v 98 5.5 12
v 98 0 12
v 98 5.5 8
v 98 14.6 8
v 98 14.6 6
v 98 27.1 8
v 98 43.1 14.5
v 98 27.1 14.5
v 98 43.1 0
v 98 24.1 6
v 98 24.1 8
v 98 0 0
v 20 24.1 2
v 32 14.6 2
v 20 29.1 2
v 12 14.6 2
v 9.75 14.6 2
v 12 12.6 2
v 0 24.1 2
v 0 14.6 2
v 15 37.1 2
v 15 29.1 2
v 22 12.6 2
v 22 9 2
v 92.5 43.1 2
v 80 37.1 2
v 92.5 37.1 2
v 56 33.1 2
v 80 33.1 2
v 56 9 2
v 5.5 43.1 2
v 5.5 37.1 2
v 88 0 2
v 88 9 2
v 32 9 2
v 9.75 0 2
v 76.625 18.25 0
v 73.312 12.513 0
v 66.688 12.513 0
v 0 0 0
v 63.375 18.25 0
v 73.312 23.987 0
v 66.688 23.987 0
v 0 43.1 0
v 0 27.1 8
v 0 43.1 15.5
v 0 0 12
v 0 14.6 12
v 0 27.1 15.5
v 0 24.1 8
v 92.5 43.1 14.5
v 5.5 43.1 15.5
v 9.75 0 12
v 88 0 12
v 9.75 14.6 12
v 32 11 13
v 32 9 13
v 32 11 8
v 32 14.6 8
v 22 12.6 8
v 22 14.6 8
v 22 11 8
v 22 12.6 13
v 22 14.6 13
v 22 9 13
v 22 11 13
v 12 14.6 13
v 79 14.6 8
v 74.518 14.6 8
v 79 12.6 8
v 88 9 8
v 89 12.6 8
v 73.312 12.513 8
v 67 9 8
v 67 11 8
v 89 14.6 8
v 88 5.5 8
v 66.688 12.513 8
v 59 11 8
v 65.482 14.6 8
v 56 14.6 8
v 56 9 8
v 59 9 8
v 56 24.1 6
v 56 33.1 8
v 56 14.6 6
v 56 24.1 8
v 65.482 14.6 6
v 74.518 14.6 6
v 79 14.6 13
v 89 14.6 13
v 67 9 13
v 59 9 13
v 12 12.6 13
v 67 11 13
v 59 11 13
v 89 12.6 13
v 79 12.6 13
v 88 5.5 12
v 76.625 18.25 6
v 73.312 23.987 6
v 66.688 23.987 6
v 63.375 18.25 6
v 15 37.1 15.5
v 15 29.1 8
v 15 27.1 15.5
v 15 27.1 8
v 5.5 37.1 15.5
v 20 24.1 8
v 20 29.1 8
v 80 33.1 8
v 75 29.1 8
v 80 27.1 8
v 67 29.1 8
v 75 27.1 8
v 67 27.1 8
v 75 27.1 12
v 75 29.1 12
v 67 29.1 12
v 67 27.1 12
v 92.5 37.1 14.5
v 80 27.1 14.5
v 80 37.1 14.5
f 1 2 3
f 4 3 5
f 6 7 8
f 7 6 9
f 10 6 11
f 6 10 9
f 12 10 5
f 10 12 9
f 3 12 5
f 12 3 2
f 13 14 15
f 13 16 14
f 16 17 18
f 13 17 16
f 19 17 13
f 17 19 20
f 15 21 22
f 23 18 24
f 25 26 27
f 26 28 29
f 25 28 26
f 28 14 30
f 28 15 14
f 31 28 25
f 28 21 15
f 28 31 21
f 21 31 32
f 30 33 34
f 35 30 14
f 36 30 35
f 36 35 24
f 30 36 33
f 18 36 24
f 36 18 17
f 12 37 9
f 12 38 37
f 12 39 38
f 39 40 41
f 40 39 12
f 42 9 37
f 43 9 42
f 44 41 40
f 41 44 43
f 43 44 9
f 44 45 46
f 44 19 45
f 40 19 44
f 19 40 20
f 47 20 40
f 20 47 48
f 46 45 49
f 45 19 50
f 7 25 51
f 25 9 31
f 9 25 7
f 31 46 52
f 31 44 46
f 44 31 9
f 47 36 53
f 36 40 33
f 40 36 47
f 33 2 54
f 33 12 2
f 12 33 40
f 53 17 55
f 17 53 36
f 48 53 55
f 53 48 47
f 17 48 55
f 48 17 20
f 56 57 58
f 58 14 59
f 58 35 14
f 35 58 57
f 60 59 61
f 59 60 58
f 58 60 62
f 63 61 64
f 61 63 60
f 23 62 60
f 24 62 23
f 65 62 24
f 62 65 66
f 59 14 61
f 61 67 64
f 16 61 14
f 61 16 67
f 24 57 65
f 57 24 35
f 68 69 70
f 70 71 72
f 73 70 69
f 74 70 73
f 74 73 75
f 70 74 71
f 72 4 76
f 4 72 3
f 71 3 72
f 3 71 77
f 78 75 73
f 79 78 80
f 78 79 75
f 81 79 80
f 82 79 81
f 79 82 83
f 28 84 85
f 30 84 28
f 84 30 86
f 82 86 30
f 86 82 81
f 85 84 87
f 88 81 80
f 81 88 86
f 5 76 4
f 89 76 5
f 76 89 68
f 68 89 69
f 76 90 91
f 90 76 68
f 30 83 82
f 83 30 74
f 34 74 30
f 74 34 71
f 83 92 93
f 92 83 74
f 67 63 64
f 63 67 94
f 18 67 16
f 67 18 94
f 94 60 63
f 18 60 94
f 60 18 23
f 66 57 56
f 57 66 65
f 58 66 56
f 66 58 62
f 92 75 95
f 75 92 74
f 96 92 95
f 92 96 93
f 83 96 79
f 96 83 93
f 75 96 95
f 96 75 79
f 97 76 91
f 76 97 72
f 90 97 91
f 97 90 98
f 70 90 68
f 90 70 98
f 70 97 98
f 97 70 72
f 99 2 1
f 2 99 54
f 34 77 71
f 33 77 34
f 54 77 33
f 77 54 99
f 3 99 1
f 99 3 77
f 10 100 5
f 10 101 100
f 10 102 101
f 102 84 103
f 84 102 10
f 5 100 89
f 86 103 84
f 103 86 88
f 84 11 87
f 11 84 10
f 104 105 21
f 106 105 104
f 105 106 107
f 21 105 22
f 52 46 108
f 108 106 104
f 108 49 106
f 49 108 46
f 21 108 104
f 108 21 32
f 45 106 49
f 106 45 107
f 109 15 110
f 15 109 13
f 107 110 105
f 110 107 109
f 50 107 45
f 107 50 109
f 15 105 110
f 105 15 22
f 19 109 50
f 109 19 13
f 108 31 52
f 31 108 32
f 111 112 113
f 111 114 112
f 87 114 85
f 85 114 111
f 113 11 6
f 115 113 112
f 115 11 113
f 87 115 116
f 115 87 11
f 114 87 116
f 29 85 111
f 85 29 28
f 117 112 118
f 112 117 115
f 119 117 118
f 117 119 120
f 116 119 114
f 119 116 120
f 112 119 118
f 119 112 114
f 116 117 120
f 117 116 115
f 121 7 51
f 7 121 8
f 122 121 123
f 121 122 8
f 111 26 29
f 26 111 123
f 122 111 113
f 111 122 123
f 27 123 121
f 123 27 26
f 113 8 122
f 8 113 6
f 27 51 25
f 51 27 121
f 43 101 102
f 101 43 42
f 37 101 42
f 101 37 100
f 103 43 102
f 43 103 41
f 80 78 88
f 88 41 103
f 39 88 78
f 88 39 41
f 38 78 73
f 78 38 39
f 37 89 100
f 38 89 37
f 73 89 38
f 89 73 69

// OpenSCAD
// Thermal imaging camera bottom plate
//
// View from front - (0, 0, 0) = front, left, bottom
//

//
// Main parts of plate
//
module base_parts() {
  union() {
    // Bottom plate
    cube([98, 43.1, 2]);

    //
    // Pi Platter section -> front
    //
    translate([0, 0, 0]) {
      cube([9.75, 14.6, 12]);  // Left mount
    }
    translate([22, 9, 0]) {
      cube([10, 5.6, 8]);      // Left PCB base
    }
    translate([56, 9, 0]) {
      cube([42, 5.6, 8]);      // Right PCB base
    }
    translate([12, 12.6, 0]) {
      cube([10, 2, 13]);       // Left PCB guide (rear of PCB)
    }
    translate([22, 9, 0]) {
      cube([10, 2, 13]);       // Middle Left PCB guide (front of PCB)
    }
    translate([59, 9, 0]) {
      cube([8, 2, 13]);        // Middle Right PCB guide (front of PCB)
    }
    translate([79, 12.6, 0]) {
      cube([10, 2, 13]);       // Right PCB guide (rear of PCB)
    }
    translate([88, 0, 0]) {
      cube([10, 5.5, 12]);     // Right mount
    }
    translate([88, 0, 0]) {
      cube([10, 9, 8]);        // Right mount extension
    }

    //
    // Battery section
    //
    translate([56, 14.6, 0]) {
      cube([42, 9.5, 6]);      // Battery base
    }

    //
    // Pocketbeagle section -> rear
    //
    translate([0, 27.1, 0]) {
      cube([15, 10, 15.5]);      // Left mount
    }
    translate([0, 24.1, 0]) {
      cube([20, 5, 8]);          // Left PCB base
    }
    translate([0, 37.1, 0]) {
      cube([5.5, 6, 15.5]);      // Left front mount
    }
    translate([56, 24.1, 0]) {
      cube([42, 9, 8]);          // Right PCB base
    }
    translate([67, 27.1, 0]) {
      cube([8, 2, 12]);          // Right PCB guide (front of PCB)
    }
    translate([80, 27.1, 0]) {
      cube([18, 10, 14.5]);      // Right mount
    }
    translate([92.5, 37.1, 0]) {
      cube([5.5, 6, 14.5]);
    }
  }
}

//
// Plate with subtraction for tripod-mount
//
difference() {
  base_parts();

  translate([70, 18.25, -1]) {
    cylinder(h=20, d=13.25, center=false, $fn=6);
  }
}
